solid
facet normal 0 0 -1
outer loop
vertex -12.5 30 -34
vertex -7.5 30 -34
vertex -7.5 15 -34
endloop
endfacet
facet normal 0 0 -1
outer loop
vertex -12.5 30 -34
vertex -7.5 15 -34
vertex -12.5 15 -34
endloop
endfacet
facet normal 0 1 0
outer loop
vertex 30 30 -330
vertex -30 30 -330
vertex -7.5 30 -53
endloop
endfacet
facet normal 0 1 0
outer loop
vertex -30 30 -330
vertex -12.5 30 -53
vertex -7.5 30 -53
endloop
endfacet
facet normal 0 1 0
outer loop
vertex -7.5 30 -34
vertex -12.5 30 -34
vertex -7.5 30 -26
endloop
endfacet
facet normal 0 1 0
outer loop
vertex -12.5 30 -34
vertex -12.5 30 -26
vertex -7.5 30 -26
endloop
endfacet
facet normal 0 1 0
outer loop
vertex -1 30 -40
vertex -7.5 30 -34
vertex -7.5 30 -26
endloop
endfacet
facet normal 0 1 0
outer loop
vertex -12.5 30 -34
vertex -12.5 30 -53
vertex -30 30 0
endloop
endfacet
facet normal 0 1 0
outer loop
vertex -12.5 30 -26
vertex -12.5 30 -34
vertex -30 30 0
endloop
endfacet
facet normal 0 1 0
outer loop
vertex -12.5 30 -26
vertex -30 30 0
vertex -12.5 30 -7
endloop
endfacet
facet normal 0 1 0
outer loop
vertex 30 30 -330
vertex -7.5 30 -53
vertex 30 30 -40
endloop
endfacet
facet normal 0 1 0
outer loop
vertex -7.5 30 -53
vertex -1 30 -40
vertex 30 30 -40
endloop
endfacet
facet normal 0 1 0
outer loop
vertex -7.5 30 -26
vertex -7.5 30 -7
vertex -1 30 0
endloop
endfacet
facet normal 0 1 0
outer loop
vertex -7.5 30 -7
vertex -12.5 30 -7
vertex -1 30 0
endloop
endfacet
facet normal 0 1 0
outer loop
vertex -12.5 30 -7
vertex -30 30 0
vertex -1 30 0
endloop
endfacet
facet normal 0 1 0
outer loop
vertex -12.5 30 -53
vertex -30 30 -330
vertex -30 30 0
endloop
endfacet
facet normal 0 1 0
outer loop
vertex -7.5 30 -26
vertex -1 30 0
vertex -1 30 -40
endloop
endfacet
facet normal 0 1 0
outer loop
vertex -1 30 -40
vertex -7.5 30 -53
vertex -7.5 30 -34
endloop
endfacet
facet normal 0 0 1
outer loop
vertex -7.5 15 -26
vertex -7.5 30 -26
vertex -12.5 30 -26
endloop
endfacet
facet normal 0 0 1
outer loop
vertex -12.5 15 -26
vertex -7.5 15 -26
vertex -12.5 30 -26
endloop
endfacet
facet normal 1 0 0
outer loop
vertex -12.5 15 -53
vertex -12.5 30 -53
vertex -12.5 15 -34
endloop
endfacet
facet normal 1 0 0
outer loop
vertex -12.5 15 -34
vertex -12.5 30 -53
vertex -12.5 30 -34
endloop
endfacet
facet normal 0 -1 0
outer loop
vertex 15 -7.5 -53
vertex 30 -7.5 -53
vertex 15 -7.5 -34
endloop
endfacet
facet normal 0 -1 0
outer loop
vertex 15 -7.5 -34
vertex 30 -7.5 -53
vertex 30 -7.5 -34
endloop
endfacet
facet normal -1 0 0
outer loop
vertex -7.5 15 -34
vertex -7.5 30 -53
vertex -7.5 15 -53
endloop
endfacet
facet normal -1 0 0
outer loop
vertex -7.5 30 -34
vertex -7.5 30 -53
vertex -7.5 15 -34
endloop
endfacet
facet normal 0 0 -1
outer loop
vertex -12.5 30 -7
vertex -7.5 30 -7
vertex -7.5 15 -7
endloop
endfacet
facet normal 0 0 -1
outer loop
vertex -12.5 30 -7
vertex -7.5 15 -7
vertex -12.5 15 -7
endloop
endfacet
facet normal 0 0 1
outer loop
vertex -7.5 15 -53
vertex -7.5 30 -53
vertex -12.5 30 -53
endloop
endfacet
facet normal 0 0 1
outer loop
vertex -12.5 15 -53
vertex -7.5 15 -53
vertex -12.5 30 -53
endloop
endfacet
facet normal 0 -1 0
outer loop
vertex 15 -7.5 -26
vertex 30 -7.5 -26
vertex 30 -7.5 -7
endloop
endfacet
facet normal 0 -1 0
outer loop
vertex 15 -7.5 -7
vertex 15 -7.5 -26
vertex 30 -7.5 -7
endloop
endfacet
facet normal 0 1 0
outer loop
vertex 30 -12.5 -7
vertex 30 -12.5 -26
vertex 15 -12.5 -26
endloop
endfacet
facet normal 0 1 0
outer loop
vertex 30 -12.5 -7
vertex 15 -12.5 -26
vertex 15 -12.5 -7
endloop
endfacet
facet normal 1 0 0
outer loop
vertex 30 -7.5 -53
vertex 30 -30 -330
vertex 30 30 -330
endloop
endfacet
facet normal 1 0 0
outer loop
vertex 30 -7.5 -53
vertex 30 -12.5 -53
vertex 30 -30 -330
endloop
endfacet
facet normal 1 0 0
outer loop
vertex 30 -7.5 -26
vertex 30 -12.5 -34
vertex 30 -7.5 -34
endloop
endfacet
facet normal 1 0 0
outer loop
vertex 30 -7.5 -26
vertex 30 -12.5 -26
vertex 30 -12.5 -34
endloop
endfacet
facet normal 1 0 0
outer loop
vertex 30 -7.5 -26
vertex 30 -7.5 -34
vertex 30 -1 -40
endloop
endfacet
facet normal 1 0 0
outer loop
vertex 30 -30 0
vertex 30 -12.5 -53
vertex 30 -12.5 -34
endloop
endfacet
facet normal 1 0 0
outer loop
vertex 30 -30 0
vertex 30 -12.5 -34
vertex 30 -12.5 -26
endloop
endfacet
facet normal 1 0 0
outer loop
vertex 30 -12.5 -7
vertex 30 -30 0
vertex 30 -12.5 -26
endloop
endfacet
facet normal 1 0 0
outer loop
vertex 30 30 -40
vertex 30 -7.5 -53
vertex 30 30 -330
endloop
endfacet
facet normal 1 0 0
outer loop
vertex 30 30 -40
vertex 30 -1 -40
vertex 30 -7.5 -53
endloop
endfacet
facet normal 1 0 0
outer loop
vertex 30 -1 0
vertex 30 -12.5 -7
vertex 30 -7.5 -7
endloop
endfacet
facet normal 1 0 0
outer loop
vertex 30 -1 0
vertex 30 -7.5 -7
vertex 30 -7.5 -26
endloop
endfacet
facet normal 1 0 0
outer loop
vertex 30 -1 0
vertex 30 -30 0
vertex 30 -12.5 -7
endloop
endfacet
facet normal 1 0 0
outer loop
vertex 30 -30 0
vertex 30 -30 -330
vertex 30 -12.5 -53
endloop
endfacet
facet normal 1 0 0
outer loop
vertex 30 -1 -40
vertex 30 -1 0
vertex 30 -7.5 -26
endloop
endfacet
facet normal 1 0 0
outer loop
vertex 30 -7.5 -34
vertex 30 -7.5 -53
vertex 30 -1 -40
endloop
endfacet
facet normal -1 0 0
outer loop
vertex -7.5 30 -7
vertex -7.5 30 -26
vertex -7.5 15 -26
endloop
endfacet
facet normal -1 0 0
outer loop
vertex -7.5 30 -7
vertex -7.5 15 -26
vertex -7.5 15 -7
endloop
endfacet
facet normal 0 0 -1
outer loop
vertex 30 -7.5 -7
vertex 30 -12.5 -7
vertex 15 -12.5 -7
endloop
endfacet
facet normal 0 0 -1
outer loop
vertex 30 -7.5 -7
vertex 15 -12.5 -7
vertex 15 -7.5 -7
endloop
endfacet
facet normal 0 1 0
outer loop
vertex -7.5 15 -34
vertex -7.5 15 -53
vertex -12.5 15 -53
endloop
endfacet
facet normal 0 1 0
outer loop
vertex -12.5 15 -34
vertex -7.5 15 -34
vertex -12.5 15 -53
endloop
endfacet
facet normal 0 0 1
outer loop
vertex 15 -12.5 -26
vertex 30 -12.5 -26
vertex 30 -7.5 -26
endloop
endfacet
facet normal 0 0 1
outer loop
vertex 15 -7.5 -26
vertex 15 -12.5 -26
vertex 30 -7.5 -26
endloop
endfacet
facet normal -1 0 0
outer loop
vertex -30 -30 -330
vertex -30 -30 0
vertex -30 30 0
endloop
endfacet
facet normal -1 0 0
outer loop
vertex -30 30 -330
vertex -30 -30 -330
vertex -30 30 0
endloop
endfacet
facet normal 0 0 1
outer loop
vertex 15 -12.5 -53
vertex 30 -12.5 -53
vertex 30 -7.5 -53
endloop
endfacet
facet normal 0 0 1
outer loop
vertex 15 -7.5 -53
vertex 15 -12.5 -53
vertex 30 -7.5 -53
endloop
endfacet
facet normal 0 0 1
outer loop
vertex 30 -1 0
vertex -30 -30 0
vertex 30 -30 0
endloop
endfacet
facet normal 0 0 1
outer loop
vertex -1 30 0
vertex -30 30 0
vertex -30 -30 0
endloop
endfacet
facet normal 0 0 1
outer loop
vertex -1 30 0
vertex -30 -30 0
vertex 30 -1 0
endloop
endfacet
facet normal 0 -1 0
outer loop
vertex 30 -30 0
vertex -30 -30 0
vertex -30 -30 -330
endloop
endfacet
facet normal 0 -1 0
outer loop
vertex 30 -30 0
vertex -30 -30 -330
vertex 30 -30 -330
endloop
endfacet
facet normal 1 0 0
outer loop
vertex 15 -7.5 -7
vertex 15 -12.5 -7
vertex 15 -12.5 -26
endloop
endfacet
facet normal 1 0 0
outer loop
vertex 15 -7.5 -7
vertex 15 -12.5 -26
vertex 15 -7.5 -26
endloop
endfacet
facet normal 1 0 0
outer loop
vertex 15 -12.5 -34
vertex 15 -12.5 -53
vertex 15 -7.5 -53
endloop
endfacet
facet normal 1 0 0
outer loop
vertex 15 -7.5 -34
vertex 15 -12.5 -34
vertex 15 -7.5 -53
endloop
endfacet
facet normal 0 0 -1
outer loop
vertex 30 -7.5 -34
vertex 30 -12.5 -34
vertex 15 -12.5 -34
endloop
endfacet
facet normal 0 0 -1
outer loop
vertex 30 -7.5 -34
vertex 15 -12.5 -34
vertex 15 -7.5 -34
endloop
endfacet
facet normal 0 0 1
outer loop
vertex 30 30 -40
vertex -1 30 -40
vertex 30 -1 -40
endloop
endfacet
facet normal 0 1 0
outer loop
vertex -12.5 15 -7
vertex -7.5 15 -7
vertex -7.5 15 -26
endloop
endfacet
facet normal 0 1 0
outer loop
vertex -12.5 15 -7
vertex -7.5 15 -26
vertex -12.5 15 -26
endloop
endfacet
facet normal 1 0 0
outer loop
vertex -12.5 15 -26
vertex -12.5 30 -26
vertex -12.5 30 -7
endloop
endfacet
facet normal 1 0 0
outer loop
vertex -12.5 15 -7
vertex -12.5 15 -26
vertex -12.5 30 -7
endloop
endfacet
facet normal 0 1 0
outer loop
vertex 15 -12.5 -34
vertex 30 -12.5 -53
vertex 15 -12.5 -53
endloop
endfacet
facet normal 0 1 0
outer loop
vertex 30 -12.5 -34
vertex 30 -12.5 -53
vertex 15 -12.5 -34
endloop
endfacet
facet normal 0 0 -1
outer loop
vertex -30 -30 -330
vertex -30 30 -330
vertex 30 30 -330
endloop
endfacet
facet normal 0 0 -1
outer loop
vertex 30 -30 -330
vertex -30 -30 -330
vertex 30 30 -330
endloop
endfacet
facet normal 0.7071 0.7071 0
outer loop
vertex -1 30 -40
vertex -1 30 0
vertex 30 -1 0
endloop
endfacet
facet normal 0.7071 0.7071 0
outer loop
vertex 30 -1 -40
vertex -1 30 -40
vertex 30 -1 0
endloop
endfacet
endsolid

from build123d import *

# Parameters (mm, degrees)
F0_W     = 60
F0_H     = 60
F1_DEPTH = 330
F3_DEPTH = 40
F4_W     = 5
F4_H     = 19
F5_DEPTH = 15
F6_W     = 5
F6_H     = 19
F7_DEPTH = 15


with BuildPart() as f1:
    # F0 (on Top) → F1 (new body)
    with BuildSketch(Plane.XY):
        Rectangle(F0_W, F0_H)
    extrude(amount=-F1_DEPTH)

    # F2 (on face) → F3 (cut)
    with BuildSketch(Plane.XY):
        Polygon((30, 30), (-1, 30), (30, -1), align=None)
    extrude(amount=-F3_DEPTH, mode=Mode.SUBTRACT)

    # F4 (on face) → F5 (cut)
    with BuildSketch(Plane.YZ.offset(30)):
        with Locations((-10, -16.5)):
            Rectangle(F4_W, F4_H)
        with Locations((-10, -43.5)):
            Rectangle(F4_W, F4_H)
    extrude(amount=-F5_DEPTH, mode=Mode.SUBTRACT)

    # F6 (on face) → F7 (cut)
    with BuildSketch(Plane(origin=(0, 30, 0), x_dir=(-1, 0, 0), z_dir=(0, 1, 0))):
        with Locations((10, -16.5)):
            Rectangle(F6_W, F6_H)
        with Locations((10, -43.5)):
            Rectangle(F6_W, F6_H)
    extrude(amount=-F7_DEPTH, mode=Mode.SUBTRACT)


solid = f1.part
